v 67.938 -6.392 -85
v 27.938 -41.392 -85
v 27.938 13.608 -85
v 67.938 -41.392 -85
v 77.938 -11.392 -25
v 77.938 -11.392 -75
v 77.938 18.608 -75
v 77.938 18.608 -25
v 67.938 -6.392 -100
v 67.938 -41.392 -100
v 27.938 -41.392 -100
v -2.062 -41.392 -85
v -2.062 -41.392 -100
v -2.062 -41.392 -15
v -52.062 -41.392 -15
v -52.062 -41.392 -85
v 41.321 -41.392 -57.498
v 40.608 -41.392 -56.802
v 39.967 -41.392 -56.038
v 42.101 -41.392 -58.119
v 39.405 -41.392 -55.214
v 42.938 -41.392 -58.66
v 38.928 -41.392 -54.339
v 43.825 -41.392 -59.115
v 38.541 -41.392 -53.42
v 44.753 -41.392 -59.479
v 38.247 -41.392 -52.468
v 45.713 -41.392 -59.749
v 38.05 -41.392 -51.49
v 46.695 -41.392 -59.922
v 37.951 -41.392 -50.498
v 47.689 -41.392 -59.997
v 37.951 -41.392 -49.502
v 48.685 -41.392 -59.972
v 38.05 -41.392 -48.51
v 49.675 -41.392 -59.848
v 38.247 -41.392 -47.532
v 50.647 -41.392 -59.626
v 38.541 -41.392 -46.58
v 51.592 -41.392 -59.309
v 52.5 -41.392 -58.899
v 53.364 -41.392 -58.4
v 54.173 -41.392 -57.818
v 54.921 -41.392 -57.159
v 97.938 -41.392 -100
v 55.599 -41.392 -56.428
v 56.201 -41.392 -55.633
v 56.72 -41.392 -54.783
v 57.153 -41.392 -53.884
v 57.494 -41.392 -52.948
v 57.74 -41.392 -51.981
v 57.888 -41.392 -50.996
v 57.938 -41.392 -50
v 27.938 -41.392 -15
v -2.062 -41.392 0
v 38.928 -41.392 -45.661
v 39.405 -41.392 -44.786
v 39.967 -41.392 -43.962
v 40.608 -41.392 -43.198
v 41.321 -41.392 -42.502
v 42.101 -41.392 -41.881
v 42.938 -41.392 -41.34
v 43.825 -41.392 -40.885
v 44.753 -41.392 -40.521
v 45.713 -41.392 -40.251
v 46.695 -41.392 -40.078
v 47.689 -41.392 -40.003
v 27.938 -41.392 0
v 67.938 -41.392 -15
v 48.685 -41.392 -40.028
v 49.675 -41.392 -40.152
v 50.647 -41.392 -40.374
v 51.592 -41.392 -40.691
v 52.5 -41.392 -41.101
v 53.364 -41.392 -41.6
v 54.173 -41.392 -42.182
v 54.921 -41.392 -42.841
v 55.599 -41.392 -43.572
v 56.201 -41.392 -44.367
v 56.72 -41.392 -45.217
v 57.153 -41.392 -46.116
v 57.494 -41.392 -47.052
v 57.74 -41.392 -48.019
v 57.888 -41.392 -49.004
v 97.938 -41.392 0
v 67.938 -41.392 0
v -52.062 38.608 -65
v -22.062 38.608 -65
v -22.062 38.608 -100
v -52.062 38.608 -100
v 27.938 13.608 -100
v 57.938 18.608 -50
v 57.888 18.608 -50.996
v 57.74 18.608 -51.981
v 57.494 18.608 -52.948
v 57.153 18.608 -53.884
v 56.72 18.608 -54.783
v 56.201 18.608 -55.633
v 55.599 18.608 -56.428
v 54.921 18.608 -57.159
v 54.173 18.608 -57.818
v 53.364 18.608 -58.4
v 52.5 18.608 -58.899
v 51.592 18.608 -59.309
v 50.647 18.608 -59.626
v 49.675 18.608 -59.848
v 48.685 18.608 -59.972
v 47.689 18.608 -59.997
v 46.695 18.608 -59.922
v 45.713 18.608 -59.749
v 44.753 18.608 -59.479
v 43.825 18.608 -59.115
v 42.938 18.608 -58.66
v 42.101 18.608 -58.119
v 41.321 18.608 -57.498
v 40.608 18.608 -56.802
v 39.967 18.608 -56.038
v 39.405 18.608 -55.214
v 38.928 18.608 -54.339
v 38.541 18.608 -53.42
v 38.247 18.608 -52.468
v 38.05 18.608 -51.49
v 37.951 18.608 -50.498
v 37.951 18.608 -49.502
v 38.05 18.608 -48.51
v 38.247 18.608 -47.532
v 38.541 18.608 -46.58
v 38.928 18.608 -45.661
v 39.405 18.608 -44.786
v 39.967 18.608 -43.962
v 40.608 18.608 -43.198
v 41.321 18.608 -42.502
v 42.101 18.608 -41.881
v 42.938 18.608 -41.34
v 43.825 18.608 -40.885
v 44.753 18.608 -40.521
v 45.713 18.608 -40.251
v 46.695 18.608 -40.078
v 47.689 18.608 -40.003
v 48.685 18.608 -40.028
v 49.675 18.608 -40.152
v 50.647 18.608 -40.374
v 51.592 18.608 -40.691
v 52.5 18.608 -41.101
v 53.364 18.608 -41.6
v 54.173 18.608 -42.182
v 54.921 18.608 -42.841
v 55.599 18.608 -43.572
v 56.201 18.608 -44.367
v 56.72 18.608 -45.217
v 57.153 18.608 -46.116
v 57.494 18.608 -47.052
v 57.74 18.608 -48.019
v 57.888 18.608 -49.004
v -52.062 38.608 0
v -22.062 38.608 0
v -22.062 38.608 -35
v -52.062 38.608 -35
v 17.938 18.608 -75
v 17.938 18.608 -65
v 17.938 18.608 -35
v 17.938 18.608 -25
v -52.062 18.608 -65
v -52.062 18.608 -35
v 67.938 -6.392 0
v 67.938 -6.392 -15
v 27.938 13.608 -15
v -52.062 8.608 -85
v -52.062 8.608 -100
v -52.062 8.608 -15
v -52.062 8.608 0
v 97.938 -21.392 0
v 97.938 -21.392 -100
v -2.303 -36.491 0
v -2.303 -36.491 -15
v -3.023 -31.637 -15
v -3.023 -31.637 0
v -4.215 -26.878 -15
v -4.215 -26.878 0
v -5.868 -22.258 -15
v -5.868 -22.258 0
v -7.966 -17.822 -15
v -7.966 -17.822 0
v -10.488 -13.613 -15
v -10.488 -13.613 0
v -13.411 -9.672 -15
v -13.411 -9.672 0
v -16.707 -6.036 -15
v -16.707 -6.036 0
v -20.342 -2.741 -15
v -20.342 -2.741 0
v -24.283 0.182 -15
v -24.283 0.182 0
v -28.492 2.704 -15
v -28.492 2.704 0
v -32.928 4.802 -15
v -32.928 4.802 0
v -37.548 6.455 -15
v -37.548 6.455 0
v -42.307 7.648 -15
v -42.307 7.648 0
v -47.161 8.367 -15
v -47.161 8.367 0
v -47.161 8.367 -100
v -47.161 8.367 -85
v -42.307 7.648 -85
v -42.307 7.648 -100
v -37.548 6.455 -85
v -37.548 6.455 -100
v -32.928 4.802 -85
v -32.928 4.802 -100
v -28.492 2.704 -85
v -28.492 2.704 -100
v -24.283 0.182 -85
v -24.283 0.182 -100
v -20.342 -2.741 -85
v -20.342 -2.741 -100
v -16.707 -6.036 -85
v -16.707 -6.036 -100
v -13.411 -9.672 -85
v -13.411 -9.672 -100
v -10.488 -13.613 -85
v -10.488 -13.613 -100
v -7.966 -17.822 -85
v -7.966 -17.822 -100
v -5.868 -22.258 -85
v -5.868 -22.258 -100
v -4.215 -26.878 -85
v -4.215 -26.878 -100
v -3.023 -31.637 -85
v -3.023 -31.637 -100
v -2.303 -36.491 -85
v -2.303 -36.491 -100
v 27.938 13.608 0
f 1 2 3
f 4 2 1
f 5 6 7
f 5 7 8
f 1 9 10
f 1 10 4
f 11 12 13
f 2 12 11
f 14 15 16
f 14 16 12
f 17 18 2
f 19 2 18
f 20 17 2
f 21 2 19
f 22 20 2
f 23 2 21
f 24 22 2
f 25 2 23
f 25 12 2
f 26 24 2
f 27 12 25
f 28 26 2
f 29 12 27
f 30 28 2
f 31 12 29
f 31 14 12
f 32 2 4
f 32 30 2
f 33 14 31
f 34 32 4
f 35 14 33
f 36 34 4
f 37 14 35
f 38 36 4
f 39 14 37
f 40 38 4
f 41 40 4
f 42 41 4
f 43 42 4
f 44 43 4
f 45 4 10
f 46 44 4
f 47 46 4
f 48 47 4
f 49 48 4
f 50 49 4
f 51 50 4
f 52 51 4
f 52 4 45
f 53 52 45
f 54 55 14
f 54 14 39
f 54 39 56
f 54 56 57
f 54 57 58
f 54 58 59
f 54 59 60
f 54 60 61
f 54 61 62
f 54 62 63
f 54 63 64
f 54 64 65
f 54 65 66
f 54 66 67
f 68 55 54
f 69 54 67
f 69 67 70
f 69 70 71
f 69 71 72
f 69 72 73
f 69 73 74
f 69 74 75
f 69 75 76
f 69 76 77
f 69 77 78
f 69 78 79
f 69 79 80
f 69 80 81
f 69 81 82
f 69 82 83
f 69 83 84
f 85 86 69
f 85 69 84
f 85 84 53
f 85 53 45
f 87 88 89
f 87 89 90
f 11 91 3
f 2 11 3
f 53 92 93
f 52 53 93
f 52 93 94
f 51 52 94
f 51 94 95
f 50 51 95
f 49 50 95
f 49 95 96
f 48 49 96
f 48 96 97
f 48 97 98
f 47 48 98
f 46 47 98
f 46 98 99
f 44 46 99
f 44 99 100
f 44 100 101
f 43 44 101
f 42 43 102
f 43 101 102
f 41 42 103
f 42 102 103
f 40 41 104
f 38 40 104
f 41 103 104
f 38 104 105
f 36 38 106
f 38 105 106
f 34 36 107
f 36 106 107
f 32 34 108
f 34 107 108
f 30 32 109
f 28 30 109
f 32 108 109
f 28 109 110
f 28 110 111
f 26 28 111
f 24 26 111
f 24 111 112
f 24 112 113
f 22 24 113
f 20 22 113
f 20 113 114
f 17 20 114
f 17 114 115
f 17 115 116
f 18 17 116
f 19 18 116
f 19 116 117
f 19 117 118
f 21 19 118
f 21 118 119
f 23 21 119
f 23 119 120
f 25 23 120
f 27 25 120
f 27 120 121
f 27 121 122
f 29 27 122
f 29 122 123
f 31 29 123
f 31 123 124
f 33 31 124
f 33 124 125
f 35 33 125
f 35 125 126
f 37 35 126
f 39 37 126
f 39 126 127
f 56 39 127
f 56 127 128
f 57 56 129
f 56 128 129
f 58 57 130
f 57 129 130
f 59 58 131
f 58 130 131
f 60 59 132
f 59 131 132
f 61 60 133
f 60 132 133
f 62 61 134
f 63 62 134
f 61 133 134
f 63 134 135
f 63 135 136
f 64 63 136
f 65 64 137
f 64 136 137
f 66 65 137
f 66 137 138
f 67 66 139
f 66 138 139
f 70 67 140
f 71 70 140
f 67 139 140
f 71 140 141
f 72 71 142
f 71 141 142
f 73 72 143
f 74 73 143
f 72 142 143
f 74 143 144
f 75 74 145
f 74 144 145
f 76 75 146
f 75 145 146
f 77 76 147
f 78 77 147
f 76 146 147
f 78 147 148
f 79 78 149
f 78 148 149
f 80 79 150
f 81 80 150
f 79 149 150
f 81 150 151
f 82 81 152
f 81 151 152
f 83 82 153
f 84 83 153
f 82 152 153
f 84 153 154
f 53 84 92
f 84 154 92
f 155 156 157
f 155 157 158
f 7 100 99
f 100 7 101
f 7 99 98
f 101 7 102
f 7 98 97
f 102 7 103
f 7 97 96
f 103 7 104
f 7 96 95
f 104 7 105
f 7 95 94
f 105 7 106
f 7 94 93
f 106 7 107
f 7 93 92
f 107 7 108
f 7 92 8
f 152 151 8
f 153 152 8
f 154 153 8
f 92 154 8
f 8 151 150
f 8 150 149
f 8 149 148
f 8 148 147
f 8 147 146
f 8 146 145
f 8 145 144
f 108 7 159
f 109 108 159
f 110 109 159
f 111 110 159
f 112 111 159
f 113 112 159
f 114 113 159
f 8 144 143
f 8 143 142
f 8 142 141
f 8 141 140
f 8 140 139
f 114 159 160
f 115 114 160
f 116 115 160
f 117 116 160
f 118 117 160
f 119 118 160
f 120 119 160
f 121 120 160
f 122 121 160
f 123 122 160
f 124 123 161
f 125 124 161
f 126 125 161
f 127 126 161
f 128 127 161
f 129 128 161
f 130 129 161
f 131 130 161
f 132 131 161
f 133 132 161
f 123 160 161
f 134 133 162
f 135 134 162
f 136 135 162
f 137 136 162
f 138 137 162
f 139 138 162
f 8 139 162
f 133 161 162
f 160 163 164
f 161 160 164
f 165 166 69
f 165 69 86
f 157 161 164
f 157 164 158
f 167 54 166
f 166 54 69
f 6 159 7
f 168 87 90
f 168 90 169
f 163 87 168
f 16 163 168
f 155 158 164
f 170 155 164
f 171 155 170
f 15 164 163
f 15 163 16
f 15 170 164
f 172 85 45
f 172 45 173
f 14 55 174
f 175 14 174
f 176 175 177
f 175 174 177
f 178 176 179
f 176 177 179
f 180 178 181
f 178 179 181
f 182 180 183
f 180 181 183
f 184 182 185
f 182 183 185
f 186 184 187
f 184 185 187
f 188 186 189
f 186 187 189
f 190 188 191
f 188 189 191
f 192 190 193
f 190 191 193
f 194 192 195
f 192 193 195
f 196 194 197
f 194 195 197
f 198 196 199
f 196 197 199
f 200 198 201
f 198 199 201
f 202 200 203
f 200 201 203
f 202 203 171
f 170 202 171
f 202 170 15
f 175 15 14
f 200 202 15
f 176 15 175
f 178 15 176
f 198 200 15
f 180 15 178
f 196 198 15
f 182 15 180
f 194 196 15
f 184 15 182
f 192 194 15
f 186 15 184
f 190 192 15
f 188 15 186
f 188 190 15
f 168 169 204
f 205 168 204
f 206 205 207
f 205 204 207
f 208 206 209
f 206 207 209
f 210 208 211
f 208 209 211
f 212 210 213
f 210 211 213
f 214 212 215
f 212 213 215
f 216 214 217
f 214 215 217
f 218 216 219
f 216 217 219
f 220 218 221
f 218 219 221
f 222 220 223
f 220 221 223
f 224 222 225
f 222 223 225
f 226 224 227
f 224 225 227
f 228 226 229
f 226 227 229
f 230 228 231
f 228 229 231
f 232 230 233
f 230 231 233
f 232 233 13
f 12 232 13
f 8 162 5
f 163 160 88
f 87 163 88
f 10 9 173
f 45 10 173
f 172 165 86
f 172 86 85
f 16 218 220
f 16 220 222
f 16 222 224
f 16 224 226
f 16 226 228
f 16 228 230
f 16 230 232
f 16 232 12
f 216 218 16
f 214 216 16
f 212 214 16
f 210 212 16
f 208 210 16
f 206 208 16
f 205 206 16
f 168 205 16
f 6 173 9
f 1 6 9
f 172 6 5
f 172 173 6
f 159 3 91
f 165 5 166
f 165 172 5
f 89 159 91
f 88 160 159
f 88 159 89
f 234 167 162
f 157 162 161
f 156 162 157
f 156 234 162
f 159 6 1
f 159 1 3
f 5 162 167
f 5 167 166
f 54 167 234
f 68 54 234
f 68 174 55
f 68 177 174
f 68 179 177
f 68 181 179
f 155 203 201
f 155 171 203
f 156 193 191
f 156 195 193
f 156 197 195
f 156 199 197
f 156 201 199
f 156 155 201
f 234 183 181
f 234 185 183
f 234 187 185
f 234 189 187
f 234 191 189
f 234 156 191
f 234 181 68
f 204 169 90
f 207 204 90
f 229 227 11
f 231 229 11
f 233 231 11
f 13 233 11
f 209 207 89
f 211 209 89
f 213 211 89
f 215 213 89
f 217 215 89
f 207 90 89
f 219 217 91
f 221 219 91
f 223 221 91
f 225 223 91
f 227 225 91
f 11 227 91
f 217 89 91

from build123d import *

# Parameters (mm, degrees)
BOSS_EXTRUDE1_DEPTH = 100
SKETCH2_R           = 50
CUT_EXTRUDE1_DEPTH  = 15
SKETCH3_R           = 50
CUT_EXTRUDE2_DEPTH  = 15
SKETCH4_W           = 40
SKETCH4_H           = 15
CUT_EXTRUDE3_DEPTH  = 75
SKETCH5_W           = 60
SKETCH5_H           = 50
BOSS_EXTRUDE2_DEPTH = 60
SKETCH7_W           = 30
SKETCH7_H           = 20
CUT_EXTRUDE4_DEPTH  = 100
SKETCH8_R           = 10
CUT_EXTRUDE5_DEPTH  = 100


with BuildPart() as part:
    # Sketch1 → Boss-Extrude1 (new body)
    with BuildSketch(Plane.XY):
        Polygon((-52.06185567, 38.608247423), (-52.06185567, -41.391752577), (97.93814433, -41.391752577), (97.93814433, -21.391752577), (-22.06185567, 38.608247423), align=None)
    extrude(amount=-BOSS_EXTRUDE1_DEPTH)

    # Sketch2 → Cut-Extrude1 (cut)
    with BuildSketch(Plane.XY):
        with Locations((-52.06185567, -41.391752577)):
            Circle(SKETCH2_R)
    extrude(amount=-CUT_EXTRUDE1_DEPTH, mode=Mode.SUBTRACT)

    # Sketch3 → Cut-Extrude2 (cut)
    with BuildSketch(Plane(origin=(0, 0, -100), x_dir=(-1, 0, 0), z_dir=(0, 0, -1))):
        with Locations((52.06185567, -41.391752577)):
            Circle(SKETCH3_R)
    extrude(amount=-CUT_EXTRUDE2_DEPTH, mode=Mode.SUBTRACT)

    # Sketch4 → Cut-Extrude3 (cut)
    with BuildSketch(Plane.XZ.offset(41.391752577)):
        with Locations((47.93814433, -7.5)):
            Rectangle(SKETCH4_W, SKETCH4_H)
        with Locations((47.93814433, -92.5)):
            Rectangle(SKETCH4_W, SKETCH4_H)
    extrude(amount=-CUT_EXTRUDE3_DEPTH, mode=Mode.SUBTRACT)

    # Sketch5 → Boss-Extrude2 (add)
    with BuildSketch(Plane.XZ.offset(41.391752577)):
        with Locations((47.93814433, -50)):
            Rectangle(SKETCH5_W, SKETCH5_H)
    extrude(amount=-BOSS_EXTRUDE2_DEPTH)

    # Sketch7 → Cut-Extrude4 (cut)
    with BuildSketch(Plane.ZY.offset(52.06185567)):
        with Locations((-50, 28.608247423)):
            Rectangle(SKETCH7_W, SKETCH7_H)
    extrude(amount=-CUT_EXTRUDE4_DEPTH, mode=Mode.SUBTRACT)

    # Sketch8 → Cut-Extrude5 (cut)
    with BuildSketch(Plane(origin=(0, 18.608247423, 0), x_dir=(1, 0, 0), z_dir=(0, 1, 0))):
        with Locations((47.93814433, 50)):
            Circle(SKETCH8_R)
    extrude(amount=-CUT_EXTRUDE5_DEPTH, mode=Mode.SUBTRACT)


solid = part.part
